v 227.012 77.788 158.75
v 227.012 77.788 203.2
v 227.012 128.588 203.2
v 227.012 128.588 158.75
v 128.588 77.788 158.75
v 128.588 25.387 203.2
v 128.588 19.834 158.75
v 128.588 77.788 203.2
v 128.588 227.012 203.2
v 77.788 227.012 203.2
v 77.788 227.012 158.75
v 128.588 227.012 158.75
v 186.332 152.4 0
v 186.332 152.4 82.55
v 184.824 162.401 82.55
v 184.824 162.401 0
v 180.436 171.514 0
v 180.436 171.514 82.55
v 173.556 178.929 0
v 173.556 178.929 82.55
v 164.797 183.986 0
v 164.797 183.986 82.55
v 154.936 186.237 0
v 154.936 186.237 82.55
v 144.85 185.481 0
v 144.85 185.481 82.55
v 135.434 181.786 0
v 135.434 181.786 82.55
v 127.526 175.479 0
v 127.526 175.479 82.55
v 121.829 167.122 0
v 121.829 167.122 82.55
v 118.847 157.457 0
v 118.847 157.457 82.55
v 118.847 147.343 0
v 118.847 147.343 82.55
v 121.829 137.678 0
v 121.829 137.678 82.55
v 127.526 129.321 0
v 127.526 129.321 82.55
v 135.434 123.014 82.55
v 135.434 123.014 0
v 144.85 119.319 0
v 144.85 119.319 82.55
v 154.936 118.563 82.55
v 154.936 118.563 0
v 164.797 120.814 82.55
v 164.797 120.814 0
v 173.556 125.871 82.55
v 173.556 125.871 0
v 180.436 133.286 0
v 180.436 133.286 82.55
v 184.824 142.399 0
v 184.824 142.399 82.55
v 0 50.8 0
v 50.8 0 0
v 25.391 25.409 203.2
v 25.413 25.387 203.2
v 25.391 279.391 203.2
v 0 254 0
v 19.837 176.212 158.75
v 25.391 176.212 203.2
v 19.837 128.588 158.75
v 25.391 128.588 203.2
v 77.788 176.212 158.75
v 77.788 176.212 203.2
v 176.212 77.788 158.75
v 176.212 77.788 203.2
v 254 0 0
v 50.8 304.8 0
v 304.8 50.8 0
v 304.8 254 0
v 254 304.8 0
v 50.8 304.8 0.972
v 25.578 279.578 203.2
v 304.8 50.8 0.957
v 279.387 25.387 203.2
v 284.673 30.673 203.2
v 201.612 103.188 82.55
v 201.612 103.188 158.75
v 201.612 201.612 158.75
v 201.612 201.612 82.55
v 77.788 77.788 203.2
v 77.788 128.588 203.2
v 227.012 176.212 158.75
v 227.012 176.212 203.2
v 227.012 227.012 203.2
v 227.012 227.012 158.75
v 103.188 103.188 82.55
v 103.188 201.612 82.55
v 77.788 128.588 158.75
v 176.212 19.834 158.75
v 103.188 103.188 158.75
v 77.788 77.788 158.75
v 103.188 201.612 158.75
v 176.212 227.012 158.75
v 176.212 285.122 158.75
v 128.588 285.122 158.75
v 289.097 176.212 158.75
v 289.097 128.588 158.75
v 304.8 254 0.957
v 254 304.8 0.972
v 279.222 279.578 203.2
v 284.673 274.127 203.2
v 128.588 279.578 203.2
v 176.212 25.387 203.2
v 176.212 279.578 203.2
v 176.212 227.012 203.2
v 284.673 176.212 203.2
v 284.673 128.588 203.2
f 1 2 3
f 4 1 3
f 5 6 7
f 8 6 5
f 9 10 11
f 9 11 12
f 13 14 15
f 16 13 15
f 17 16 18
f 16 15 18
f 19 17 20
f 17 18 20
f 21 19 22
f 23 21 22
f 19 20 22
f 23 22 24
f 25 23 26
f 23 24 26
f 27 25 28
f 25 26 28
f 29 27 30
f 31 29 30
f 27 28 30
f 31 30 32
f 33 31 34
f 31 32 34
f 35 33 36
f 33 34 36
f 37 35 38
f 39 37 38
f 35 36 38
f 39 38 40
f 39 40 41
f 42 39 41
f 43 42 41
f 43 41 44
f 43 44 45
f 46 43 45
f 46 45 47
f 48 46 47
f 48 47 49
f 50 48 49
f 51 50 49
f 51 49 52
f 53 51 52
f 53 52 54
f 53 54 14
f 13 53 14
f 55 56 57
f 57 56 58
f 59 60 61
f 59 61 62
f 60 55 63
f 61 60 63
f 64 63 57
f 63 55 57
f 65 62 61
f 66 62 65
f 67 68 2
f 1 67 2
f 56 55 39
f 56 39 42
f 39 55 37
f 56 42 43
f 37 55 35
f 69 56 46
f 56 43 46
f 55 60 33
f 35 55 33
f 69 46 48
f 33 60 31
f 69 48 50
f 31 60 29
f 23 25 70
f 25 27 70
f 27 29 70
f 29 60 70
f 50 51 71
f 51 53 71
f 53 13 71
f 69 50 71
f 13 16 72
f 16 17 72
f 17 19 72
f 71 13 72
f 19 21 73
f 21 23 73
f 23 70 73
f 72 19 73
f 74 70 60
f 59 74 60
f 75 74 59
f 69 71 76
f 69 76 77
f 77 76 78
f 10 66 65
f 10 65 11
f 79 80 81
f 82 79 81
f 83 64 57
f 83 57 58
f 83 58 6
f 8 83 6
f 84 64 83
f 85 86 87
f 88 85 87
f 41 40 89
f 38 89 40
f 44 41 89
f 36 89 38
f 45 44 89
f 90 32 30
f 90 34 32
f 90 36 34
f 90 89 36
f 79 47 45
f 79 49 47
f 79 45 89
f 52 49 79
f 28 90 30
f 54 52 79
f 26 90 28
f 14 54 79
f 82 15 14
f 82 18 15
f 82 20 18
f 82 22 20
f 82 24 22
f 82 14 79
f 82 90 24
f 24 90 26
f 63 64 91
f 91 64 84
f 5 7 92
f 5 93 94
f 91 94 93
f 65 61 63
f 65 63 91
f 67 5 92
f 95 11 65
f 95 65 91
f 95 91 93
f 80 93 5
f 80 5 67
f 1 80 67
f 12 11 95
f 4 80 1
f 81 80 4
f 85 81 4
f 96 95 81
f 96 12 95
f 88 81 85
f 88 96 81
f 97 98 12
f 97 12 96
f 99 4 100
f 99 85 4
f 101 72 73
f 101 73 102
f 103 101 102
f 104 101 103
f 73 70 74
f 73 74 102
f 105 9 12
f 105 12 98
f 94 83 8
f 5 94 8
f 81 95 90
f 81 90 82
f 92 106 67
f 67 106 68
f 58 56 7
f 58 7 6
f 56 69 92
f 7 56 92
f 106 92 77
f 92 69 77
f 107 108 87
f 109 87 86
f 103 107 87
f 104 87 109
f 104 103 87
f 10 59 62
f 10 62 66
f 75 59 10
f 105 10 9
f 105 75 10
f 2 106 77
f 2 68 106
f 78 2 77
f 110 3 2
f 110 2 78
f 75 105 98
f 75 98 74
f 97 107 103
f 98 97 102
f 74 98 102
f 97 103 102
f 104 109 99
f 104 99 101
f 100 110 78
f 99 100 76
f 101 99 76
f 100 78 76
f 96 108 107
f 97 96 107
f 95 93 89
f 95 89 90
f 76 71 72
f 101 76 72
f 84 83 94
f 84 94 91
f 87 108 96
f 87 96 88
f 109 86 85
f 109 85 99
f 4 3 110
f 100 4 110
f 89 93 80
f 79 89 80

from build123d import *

# Parameters (mm, degrees)
F0_W      = 304.8
F0_H      = 304.8
F1_DEPTH  = 203.2
F2_W      = 149.225
F2_H      = 149.225
F3_DEPTH  = 44.45
F4_W      = 47.625
F4_H      = 77.7875
F4_W_2    = 77.7875
F4_H_2    = 47.625
F5_DEPTH  = 44.45
F6_SIZE   = 50.8
F7_R      = 33.9315428176
F8_DEPTH  = 158.751
F9_W      = 98.425
F9_H      = 98.425
F9_R      = 33.9315428176
F10_DEPTH = 76.2
F12_DEPTH = 304.801
F14_DEPTH = 304.801


with BuildPart() as f1:
    # F0 (on Top) → F1 (new body)
    with BuildSketch(Plane.XY):
        with Locations((152.4, 152.4)):
            Rectangle(F0_W, F0_H)
    extrude(amount=F1_DEPTH)

    # F2 (on face) → F3 (cut)
    with BuildSketch(Plane.XY.offset(203.2)):
        with Locations((152.4, 152.4)):
            Rectangle(F2_W, F2_H)
    extrude(amount=-F3_DEPTH, mode=Mode.SUBTRACT)

    # F4 (on face) → F5 (cut)
    with BuildSketch(Plane.XY.offset(203.2)):
        with Locations((152.4, 265.90625)):
            Rectangle(F4_W, F4_H)
        with Locations((152.4, 38.89375)):
            Rectangle(F4_W, F4_H)
        with Locations((265.90625, 152.4)):
            Rectangle(F4_W_2, F4_H_2)
        with Locations((38.89375, 152.4)):
            Rectangle(F4_W_2, F4_H_2)
    extrude(amount=-F5_DEPTH, mode=Mode.SUBTRACT)

    # F6
    f6_edges = [f1.edges().sort_by_distance(p)[0] for p in [
        (304.8, 0, 101.6),
        (304.8, 304.8, 101.6),
        (0, 0, 101.6),
        (0, 304.8, 101.6),
    ]]
    chamfer(f6_edges, length=F6_SIZE)

    # F7 (on face) → F8 (cut, through all)
    with BuildSketch(Plane.XY.offset(158.75)):
        with Locations((152.4, 152.4)):
            Circle(F7_R)
    extrude(amount=-F8_DEPTH, mode=Mode.SUBTRACT)

    # F9 (on face) → F10 (cut)
    with BuildSketch(Plane.XY.offset(158.75)):
        with Locations((152.4, 152.4)):
            Rectangle(F9_W, F9_H)
        with Locations((152.4, 152.4)):
            Circle(F9_R, mode=Mode.SUBTRACT)
    extrude(amount=-F10_DEPTH, mode=Mode.SUBTRACT)

    # F11 (on face) → F12 (cut, through all)
    with BuildSketch(Plane.XZ):
        Polygon((0, 203.2701924012), (0, 0), (25.4, 203.2701924012), align=None)
        Polygon((284.6523523331, 203.4087479115), (304.8951923847, 0), (304.8951923847, 203.4087479115), align=None)
    extrude(amount=-F12_DEPTH, mode=Mode.SUBTRACT)

    # F13 (on face) → F14 (cut, through all)
    with BuildSketch(Plane.YZ.offset(304.8)):
        Polygon((0, 203.302398324), (0, 0), (25.4, 203.302398324), align=None)
        Polygon((279.5212098122, 203.6561071873), (304.9212098122, 0), (304.9212098122, 203.6561071873), align=None)
    extrude(amount=-F14_DEPTH, mode=Mode.SUBTRACT)


solid = f1.part
